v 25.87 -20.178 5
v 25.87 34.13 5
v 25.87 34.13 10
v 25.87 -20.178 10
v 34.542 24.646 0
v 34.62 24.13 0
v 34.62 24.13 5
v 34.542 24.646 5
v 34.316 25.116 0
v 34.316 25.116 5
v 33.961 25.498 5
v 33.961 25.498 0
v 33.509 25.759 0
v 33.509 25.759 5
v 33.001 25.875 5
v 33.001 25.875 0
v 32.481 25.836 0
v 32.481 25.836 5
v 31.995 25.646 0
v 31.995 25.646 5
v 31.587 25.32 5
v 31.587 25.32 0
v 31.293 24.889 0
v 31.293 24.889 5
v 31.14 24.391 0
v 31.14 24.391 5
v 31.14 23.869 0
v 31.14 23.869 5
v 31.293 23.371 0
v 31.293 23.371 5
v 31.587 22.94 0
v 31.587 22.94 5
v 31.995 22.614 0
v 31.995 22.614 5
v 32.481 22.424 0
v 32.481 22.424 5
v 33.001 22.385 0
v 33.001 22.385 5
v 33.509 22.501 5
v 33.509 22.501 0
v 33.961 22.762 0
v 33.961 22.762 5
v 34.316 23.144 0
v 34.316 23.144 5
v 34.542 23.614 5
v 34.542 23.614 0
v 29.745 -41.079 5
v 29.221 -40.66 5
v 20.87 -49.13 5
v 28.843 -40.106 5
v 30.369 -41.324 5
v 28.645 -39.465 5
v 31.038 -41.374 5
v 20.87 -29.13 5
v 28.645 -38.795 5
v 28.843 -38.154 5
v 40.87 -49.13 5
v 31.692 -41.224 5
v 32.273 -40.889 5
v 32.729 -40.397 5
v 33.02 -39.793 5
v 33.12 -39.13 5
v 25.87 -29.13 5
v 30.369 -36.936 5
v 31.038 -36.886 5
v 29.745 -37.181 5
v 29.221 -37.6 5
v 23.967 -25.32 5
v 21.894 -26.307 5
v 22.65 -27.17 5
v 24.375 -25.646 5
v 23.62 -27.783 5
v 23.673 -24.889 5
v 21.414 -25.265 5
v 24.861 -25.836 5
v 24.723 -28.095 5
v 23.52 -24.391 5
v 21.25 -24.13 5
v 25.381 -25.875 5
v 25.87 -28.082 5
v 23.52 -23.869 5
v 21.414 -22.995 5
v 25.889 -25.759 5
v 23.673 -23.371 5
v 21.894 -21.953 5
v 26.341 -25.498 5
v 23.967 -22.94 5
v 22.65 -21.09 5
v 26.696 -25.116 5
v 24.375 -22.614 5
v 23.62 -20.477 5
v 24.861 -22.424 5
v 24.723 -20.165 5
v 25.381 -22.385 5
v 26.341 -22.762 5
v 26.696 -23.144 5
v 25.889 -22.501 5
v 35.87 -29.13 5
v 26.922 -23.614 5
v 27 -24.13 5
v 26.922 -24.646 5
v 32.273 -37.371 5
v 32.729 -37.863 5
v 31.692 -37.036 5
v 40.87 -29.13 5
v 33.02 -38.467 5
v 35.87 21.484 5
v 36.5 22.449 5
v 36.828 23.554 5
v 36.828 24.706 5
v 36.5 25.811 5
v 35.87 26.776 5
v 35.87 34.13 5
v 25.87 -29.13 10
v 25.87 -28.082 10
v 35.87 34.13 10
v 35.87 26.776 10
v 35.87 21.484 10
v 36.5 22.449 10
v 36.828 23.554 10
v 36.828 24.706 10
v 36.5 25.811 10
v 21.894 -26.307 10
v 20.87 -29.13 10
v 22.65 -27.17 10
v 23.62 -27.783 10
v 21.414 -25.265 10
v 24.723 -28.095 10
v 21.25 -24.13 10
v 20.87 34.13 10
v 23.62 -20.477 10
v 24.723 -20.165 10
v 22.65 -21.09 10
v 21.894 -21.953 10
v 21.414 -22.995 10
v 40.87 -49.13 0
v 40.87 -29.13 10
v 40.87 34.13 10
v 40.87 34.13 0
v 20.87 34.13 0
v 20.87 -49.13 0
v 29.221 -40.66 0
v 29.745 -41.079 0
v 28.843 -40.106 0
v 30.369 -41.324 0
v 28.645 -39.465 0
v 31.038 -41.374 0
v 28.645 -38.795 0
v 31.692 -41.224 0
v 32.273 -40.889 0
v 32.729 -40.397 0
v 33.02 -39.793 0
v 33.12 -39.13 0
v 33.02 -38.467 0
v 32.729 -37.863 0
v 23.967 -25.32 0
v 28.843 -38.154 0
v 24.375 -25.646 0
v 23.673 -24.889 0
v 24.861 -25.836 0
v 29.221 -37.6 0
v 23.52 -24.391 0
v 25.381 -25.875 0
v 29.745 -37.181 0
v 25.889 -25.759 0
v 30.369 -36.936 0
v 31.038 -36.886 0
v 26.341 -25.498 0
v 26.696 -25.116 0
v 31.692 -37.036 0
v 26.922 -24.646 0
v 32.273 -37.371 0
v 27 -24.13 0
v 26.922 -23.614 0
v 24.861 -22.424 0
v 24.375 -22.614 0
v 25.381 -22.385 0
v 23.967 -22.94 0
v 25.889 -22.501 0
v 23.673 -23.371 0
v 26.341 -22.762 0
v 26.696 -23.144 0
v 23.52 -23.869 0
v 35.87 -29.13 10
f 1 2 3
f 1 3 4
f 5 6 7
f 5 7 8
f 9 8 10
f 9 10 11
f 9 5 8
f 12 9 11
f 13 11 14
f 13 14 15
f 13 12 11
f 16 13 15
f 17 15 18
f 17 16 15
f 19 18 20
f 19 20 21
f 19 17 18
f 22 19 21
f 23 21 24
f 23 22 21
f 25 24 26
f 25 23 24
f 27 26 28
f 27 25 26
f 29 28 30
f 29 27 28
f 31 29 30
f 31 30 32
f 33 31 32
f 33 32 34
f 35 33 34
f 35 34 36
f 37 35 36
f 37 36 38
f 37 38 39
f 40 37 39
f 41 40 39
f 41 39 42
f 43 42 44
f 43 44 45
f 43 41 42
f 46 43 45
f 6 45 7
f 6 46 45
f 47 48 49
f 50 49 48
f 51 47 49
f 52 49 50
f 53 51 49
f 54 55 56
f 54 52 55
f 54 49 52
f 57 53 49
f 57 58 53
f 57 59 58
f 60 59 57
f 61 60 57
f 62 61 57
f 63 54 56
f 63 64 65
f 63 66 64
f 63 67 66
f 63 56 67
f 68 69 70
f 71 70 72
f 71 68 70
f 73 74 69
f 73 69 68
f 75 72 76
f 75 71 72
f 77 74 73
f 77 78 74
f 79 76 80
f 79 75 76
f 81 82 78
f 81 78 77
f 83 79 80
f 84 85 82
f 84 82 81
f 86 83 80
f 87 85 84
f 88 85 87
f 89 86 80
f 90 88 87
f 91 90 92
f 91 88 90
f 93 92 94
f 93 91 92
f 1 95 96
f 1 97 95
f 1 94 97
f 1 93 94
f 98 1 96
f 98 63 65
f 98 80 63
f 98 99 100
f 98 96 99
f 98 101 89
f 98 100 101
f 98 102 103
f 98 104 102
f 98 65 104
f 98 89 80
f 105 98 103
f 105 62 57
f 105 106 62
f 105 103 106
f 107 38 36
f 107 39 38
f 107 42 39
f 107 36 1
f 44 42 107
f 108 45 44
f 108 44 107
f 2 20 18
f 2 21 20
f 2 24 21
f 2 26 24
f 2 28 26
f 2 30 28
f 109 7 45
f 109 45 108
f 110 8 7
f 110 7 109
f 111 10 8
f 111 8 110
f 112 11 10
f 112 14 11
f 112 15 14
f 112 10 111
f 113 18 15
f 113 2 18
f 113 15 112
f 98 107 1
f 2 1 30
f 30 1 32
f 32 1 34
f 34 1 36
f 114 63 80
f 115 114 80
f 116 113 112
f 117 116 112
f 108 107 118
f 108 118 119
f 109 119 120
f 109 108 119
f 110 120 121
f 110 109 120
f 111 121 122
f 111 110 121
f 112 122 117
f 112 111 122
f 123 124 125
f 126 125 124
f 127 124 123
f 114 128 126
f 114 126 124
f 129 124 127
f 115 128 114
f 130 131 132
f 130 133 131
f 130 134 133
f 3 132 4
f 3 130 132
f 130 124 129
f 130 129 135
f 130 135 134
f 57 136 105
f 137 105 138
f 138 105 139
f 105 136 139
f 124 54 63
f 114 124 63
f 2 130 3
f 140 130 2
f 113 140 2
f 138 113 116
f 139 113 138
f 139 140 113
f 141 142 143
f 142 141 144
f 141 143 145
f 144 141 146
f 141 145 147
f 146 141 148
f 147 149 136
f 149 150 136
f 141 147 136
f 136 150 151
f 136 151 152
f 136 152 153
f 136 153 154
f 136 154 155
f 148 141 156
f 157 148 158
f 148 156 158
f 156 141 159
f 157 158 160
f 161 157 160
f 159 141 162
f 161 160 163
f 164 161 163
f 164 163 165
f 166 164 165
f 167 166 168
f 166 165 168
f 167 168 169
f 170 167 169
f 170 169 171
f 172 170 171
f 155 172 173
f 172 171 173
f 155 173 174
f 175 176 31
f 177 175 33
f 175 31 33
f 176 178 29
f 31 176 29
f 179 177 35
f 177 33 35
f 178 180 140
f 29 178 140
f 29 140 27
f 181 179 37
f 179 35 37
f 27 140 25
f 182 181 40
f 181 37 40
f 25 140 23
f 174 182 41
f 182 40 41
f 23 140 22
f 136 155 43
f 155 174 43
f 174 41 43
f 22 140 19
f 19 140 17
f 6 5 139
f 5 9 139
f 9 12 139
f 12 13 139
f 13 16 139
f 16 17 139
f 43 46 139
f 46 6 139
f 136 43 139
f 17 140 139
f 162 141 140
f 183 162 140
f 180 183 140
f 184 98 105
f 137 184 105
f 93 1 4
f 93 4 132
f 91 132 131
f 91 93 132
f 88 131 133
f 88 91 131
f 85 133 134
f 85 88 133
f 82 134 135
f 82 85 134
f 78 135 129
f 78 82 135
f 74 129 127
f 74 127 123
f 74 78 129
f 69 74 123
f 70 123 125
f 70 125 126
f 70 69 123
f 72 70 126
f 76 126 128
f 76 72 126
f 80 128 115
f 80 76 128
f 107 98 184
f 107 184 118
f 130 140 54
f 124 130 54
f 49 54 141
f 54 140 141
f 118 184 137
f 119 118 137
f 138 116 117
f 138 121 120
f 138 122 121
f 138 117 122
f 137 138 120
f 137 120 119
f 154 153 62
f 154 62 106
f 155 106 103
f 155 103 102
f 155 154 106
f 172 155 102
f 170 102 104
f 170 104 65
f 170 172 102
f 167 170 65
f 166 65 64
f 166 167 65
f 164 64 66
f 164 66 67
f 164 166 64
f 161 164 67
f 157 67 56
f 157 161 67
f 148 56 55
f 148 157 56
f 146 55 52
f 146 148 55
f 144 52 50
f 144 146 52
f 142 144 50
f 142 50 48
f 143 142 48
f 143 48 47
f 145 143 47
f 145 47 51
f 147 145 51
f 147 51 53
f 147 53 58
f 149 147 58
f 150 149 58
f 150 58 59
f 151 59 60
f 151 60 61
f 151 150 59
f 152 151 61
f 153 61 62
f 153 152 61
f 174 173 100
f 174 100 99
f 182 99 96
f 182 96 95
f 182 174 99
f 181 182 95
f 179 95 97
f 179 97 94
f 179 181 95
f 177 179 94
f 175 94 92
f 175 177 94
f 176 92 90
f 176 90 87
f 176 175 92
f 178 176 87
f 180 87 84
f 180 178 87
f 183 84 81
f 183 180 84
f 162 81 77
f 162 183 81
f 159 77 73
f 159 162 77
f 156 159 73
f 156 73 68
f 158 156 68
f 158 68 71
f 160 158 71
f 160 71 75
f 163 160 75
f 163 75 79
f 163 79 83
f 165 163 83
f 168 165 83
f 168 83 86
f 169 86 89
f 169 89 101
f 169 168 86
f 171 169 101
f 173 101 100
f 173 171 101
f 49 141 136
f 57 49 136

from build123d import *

# Parameters (mm, degrees)
SKETCH_W     = 20
SKETCH_H     = 83.26
SKETCH_R     = 1.75
SKETCH_R_2   = 2.25
PAD_DEPTH    = 5
PAD001_DEPTH = 5


with BuildPart() as part:
    # Sketch → Pad (new body)
    with BuildSketch(Plane.XY):
        with Locations((30.87, -7.5)):
            Rectangle(SKETCH_W, SKETCH_H)
        with Locations((25.25, -24.13)):
            Circle(SKETCH_R, mode=Mode.SUBTRACT)
        with Locations((32.87, 24.13)):
            Circle(SKETCH_R, mode=Mode.SUBTRACT)
        with Locations((30.87, -39.13)):
            Circle(SKETCH_R_2, mode=Mode.SUBTRACT)
    extrude(amount=PAD_DEPTH)

    # Sketch001 → Pad001 (new body)
    with BuildSketch(Plane.XY.offset(5)):
        with BuildLine():
            Line((20.87, 34.13), (20.87, -29.13))
            Line((20.87, -29.13), (25.87, -29.13))
            Line((25.87, -29.13), (25.87, -28.081658))
            ThreePointArc((25.87, -20.178342), (21.25, -24.13), (25.87, -28.081658))
            Line((25.87, 34.13), (25.87, -20.178342))
            Line((20.87, 34.13), (25.87, 34.13))
        make_face()
        with BuildLine():
            Line((40.87, 34.13), (35.87, 34.13))
            Line((35.87, 34.13), (35.87, 26.775751))
            ThreePointArc((35.87, 21.484249), (36.87, 24.13), (35.87, 26.775751))
            Line((35.87, -29.13), (35.87, 21.484249))
            Line((35.87, -29.13), (40.87, -29.13))
            Line((40.87, -29.13), (40.87, 34.13))
        make_face()
    extrude(amount=PAD001_DEPTH)


solid = part.part
